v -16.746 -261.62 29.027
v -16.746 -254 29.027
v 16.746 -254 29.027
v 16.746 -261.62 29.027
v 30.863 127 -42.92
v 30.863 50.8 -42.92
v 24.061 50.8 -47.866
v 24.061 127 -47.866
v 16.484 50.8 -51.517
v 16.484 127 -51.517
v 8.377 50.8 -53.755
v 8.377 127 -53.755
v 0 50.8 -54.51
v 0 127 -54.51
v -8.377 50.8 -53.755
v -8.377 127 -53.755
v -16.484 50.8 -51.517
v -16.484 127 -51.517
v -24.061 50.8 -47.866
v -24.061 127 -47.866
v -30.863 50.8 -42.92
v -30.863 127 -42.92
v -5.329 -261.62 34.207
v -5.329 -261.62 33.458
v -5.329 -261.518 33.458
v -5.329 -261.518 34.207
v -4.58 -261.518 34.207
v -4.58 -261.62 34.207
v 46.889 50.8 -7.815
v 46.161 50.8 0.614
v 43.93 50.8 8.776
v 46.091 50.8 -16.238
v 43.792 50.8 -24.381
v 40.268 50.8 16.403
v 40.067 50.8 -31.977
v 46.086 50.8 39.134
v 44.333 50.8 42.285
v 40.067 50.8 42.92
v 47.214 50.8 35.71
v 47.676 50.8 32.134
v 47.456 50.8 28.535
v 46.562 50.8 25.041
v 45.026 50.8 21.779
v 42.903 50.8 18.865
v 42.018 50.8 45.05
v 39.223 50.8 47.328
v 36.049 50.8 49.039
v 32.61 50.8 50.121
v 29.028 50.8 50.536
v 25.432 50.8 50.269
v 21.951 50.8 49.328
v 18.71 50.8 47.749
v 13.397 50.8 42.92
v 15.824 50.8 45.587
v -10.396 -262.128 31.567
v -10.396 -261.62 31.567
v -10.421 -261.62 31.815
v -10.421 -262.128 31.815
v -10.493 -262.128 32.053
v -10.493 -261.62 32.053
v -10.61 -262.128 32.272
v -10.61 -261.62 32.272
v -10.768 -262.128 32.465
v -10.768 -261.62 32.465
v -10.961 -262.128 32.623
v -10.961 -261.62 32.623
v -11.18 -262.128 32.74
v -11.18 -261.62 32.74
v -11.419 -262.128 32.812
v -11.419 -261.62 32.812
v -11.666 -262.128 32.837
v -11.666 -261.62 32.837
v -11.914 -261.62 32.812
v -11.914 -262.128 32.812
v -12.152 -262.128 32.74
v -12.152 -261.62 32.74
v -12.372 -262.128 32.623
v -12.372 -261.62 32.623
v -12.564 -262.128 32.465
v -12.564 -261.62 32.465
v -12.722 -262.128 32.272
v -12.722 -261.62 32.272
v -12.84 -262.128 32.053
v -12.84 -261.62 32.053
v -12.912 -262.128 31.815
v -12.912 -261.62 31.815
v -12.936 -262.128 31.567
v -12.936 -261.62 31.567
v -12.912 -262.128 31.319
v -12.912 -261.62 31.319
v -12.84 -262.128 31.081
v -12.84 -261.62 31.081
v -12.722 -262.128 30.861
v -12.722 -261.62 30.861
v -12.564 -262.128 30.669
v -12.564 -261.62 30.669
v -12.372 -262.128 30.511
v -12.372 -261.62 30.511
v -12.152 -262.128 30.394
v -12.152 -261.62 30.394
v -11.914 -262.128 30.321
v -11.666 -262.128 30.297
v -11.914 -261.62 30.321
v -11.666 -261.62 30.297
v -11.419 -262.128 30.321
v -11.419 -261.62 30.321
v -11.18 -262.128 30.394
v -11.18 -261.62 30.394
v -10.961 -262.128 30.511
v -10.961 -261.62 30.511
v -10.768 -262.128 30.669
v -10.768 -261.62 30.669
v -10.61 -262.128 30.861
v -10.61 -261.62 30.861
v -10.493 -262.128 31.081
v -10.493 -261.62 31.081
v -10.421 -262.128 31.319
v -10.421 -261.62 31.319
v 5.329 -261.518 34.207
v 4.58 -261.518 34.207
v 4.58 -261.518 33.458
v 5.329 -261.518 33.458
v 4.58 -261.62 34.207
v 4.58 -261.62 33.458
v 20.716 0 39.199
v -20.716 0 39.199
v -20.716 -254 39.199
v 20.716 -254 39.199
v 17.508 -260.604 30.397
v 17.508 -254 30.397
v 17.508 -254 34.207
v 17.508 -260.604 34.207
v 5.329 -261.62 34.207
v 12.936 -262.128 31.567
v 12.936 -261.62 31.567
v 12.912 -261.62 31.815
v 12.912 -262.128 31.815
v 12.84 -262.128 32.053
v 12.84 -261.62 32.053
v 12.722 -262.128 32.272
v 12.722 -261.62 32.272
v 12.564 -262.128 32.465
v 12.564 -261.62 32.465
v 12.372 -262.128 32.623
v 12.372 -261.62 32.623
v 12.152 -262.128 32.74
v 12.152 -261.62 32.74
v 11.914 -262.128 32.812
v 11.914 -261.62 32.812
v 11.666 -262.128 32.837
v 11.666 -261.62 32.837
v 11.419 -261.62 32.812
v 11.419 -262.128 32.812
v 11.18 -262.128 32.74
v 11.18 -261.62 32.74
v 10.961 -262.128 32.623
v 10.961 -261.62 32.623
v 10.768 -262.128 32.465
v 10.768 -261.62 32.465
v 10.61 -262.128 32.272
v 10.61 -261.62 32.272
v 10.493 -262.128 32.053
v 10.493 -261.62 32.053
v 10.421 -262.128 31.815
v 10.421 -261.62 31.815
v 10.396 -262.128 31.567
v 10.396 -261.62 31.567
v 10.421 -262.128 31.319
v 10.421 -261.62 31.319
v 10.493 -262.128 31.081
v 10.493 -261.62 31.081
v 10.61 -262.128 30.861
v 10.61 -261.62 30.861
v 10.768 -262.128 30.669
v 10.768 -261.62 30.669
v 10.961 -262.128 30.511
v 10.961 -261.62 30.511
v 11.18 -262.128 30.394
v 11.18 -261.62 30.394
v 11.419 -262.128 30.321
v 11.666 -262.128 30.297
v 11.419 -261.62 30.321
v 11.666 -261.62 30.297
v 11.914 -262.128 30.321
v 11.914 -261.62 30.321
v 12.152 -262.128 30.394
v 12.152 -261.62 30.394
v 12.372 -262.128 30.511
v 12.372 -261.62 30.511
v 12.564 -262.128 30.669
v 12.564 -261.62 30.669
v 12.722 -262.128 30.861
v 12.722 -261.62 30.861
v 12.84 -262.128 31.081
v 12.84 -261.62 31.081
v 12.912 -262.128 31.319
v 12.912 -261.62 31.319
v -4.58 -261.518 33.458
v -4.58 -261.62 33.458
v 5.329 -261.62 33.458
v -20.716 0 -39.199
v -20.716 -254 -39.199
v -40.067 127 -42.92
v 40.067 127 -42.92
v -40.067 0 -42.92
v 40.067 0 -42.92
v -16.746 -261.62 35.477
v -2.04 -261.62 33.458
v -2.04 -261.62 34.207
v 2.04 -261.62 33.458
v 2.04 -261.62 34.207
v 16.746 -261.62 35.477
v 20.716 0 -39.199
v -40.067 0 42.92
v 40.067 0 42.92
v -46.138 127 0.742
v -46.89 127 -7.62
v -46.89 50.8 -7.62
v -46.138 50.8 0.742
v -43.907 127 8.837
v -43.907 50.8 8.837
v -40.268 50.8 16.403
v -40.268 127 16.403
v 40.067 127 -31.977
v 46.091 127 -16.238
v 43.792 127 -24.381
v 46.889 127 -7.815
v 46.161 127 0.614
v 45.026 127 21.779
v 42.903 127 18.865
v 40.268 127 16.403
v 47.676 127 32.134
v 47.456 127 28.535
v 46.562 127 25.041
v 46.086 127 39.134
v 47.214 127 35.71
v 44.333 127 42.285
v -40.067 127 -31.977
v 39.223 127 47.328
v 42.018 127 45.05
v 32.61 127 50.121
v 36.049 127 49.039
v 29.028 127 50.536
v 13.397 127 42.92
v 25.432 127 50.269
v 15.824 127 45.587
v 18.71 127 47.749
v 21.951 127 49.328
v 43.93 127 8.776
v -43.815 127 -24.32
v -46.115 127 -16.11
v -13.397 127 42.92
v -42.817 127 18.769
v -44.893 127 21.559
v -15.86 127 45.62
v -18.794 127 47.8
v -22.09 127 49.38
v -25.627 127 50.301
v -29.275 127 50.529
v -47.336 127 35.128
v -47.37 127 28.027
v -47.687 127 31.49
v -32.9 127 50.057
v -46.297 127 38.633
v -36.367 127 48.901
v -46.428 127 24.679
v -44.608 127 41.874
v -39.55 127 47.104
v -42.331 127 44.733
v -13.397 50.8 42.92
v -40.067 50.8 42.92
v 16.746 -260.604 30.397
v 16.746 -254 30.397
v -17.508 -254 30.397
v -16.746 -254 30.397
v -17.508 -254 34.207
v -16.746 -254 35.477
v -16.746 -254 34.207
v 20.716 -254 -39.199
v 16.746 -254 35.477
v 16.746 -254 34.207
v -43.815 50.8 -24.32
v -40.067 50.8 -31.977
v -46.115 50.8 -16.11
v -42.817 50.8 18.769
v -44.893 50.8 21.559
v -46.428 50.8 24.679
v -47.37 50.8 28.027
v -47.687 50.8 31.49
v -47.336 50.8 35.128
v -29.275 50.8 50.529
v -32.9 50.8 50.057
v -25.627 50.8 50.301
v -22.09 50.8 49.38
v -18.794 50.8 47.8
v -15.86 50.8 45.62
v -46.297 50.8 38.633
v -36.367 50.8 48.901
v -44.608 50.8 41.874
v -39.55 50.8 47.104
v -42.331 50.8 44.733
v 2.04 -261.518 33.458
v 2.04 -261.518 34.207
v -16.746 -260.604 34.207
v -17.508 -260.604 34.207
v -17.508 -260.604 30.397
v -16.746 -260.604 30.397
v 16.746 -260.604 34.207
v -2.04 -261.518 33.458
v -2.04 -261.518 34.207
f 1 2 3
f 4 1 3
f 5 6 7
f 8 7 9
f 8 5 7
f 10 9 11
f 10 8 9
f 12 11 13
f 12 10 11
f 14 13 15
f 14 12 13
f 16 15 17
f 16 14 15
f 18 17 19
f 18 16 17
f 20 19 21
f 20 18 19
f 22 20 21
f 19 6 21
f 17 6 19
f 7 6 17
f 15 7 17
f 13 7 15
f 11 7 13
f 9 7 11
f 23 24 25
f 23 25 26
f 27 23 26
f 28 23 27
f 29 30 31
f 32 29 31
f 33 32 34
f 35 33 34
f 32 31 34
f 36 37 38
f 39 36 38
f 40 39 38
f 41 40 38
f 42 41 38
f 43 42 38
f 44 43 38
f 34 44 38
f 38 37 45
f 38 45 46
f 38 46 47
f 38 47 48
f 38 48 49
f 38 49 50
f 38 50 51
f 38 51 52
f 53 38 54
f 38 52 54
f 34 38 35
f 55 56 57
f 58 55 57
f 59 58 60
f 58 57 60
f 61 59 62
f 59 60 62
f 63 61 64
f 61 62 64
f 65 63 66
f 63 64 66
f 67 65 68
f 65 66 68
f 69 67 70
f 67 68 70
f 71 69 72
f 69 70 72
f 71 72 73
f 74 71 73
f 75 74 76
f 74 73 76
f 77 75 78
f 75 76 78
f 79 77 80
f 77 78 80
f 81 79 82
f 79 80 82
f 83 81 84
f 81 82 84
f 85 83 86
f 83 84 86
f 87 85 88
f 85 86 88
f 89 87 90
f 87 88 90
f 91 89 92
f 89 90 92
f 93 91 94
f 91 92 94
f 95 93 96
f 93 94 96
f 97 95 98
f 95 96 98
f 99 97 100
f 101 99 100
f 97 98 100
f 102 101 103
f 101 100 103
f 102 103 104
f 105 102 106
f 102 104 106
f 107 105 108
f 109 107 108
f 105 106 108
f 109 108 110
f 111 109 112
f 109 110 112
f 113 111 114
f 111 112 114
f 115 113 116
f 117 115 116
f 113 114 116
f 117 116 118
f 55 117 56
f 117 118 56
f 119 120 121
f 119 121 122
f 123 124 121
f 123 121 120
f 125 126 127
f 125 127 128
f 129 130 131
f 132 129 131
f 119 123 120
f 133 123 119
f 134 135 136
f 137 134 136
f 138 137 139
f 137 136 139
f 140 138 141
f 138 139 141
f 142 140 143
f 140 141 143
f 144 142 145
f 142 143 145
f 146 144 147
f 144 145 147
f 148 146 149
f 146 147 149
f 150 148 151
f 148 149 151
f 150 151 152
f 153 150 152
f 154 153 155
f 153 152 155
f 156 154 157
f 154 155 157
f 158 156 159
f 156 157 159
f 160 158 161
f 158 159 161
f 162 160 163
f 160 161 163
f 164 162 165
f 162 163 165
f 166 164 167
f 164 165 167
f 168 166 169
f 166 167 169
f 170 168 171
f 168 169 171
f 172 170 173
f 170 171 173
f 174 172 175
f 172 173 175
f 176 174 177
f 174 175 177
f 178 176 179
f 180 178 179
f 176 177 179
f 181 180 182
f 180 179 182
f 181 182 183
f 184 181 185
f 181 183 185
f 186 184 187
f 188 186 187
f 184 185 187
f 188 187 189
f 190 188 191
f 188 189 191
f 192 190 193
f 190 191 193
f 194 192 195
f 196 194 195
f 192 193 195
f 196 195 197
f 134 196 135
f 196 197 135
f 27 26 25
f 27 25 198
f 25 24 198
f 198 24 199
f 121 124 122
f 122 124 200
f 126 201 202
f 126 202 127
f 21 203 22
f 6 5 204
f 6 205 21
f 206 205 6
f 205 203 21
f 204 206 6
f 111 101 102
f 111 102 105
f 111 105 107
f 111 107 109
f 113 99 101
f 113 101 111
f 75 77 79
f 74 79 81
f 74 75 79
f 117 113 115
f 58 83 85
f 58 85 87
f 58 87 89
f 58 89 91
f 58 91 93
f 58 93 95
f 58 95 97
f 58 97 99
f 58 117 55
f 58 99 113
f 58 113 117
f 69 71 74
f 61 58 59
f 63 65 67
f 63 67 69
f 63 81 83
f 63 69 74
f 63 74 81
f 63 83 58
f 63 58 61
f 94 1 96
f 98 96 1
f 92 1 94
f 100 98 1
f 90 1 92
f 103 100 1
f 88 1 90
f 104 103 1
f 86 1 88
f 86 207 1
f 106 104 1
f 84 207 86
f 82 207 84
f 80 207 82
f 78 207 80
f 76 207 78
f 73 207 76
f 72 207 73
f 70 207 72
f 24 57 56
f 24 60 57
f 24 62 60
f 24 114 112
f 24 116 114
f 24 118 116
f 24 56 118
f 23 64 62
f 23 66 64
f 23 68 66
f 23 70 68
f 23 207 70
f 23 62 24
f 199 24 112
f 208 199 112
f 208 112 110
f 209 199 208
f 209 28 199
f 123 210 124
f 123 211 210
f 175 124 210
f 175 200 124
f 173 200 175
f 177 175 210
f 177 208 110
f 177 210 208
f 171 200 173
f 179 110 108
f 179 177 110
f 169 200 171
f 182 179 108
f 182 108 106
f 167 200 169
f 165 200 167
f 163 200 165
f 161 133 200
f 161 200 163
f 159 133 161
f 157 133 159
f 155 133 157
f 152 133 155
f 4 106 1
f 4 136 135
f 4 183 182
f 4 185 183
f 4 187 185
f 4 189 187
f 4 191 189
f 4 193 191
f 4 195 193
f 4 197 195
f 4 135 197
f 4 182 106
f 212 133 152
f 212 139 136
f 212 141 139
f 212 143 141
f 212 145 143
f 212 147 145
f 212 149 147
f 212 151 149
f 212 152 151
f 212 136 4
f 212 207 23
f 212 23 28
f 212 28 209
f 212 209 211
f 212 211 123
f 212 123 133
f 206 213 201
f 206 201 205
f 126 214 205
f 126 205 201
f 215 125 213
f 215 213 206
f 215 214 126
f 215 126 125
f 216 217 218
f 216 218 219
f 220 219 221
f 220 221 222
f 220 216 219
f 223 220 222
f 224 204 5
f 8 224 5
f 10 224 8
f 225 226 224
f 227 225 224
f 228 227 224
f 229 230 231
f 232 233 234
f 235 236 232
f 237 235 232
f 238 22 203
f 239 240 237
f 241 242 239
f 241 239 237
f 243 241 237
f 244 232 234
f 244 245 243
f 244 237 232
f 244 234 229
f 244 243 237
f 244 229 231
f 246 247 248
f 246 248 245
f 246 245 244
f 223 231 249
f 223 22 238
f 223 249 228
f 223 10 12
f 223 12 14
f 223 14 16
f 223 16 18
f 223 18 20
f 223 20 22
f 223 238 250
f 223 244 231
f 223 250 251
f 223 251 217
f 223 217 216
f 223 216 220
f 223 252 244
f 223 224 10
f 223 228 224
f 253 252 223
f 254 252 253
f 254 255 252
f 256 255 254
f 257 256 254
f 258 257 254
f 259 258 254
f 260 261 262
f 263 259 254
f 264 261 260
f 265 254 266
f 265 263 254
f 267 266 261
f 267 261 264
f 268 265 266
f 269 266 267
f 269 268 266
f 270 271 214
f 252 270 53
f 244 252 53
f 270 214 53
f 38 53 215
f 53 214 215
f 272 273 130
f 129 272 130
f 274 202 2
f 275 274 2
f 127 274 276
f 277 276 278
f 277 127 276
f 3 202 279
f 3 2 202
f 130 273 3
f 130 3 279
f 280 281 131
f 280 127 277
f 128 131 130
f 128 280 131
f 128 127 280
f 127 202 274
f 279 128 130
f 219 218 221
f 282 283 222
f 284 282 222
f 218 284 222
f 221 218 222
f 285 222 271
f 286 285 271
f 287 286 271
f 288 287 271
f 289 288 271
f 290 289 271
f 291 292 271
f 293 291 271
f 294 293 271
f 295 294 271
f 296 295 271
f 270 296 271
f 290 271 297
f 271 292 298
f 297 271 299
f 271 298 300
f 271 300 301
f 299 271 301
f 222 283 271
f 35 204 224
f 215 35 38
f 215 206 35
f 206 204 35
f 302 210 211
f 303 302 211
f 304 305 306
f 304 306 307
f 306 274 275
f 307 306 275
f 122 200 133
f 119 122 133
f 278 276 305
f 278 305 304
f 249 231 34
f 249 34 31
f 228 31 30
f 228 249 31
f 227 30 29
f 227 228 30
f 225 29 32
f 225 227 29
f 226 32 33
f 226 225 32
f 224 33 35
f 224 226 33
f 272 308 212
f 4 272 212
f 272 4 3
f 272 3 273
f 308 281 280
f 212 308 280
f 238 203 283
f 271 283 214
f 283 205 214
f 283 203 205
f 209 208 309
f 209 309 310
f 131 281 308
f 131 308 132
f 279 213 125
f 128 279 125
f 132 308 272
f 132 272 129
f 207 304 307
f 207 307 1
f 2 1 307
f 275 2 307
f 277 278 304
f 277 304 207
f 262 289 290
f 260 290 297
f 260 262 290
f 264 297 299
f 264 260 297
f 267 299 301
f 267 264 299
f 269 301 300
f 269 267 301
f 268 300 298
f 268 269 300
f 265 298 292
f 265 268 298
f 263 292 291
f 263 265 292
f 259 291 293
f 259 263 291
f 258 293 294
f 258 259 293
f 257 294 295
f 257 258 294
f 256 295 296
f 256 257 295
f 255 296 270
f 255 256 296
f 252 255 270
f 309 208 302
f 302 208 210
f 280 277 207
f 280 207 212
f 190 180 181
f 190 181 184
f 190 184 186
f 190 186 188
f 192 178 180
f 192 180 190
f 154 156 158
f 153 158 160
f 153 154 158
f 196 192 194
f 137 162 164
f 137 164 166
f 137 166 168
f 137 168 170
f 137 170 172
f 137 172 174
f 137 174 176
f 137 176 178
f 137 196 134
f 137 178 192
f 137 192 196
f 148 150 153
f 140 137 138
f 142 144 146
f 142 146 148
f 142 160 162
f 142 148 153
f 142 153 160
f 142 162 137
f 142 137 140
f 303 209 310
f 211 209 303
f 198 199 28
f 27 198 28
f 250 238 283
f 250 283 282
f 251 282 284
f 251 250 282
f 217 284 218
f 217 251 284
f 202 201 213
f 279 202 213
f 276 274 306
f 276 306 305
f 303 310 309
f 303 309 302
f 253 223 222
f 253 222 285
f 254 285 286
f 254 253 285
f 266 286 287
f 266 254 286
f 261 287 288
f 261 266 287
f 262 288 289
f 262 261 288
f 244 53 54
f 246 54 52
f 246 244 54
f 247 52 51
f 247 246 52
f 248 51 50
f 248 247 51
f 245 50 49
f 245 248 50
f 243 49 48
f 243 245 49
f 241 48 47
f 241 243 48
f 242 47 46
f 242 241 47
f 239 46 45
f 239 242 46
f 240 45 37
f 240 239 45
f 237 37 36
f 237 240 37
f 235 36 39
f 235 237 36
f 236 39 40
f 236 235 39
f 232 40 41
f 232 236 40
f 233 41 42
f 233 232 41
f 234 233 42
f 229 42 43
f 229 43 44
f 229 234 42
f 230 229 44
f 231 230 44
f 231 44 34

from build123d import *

# Parameters (mm, degrees)
F0_W      = 41.4315387607
F0_H      = 78.3974006772
F1_DEPTH  = 254
F2_W      = 80.1340416074
F2_H      = 85.8401879668
F3_DEPTH  = 127
F4_W      = 33.4925614297
F4_H      = 6.4504221082
F5_DEPTH  = 7.62
F6_W      = 4.0796049871
F6_H      = 0.7493942976
F6_W_2    = 0.7494016
F7_DEPTH  = 0.1016
F8_R      = 1.27
F9_DEPTH  = 0.508
F10_W     = 0.762
F10_H     = 3.81
F11_DEPTH = 6.604
F13_DEPTH = 76.2


with BuildPart() as f1:
    # F0 (on Front) → F1 (new body)
    with BuildSketch(Plane.XZ):
        Rectangle(F0_W, F0_H)
    extrude(amount=F1_DEPTH)

    # F2 (on Front) → F3 (join)
    with BuildSketch(Plane.XZ):
        Rectangle(F2_W, F2_H)
    extrude(amount=-F3_DEPTH)

    # F4 (on face) → F5 (join)
    with BuildSketch(Plane.XZ.offset(254)):
        with Locations((0, 32.2520956397)):
            Rectangle(F4_W, F4_H)
    extrude(amount=F5_DEPTH)

    # F6 (on face) → F7 (cut)
    with BuildSketch(Plane.XZ.offset(261.62)):
        with Locations((0, 33.832609545)):
            Rectangle(F6_W, F6_H)
        with Locations((4.9545032935, 33.832609545)):
            Rectangle(F6_W_2, F6_H)
        with Locations((-4.9545032935, 33.832609545)):
            Rectangle(F6_W_2, F6_H)
    extrude(amount=-F7_DEPTH, mode=Mode.SUBTRACT)

    # F8 (on face) → F9 (join)
    with BuildSketch(Plane.XZ.offset(261.62)):
        with Locations((-11.6662807149, 31.5668845856)):
            Circle(F8_R)
        with Locations((11.6662807149, 31.5668845856)):
            Circle(F8_R)
    extrude(amount=F9_DEPTH)

    # F10 (on face) → F11 (join)
    with BuildSketch(Plane.XZ.offset(254)):
        with Locations((-17.1272807149, 32.3023066938)):
            Rectangle(F10_W, F10_H)
        with Locations((17.1272807149, 32.3023066938)):
            Rectangle(F10_W, F10_H)
    extrude(amount=F11_DEPTH)

    # F12 (on face) → F13 (join)
    with BuildSketch(Plane(origin=(0, 127, 0), x_dir=(-1, 0, 0), z_dir=(0, 1, 0))):
        with BuildLine():
            ThreePointArc((-40.2683013835, 16.40315221), (-20.2308740956, 14.3950889374), (-9.5870208037, 31.4900939834))
            ThreePointArc((-9.5870208037, 31.4900939834), (-9.8780164285, 34.807058688), (-10.7421131765, 38.0226877267))
            ThreePointArc((-10.7421131765, 38.0226877267), (-27.7013840338, 30.2122780312), (-40.2683013835, 16.40315221))
        make_face()
        with BuildLine():
            ThreePointArc((-10.7421131765, 38.0226877267), (-9.8780164285, 34.807058688), (-9.5870208037, 31.4900939834))
            ThreePointArc((-9.5870208037, 31.4900939834), (-20.2308740956, 14.3950889374), (-40.2683013835, 16.40315221))
            ThreePointArc((-40.2683013835, 16.40315221), (-12.4594875766, -52.8240828659), (46.8897423582, -7.62))
            ThreePointArc((46.8897423582, -7.62), (45.2040828659, 4.8394875766), (40.2683013835, 16.40315221))
            ThreePointArc((40.2683013835, 16.40315221), (17.3827178516, 16.1198901766), (10.7421131765, 38.0226877267))
            ThreePointArc((10.7421131765, 38.0226877267), (0, 39.2697423582), (-10.7421131765, 38.0226877267))
        make_face()
        with BuildLine():
            ThreePointArc((-40.2683013835, 16.40315221), (-27.7013840338, 30.2122780312), (-10.7421131765, 38.0226877267))
            ThreePointArc((-10.7421131765, 38.0226877267), (-39.8913237558, 46.8602977902), (-40.2683013835, 16.40315221))
        make_face()
        with BuildLine():
            ThreePointArc((40.2683013835, 16.40315221), (27.7013840338, 30.2122780312), (10.7421131765, 38.0226877267))
            ThreePointArc((10.7421131765, 38.0226877267), (17.3827178516, 16.1198901766), (40.2683013835, 16.40315221))
        make_face()
        with BuildLine():
            ThreePointArc((47.6870208037, 31.4900939834), (31.9539855082, 50.2490983586), (10.7421131765, 38.0226877267))
            ThreePointArc((10.7421131765, 38.0226877267), (27.7013840338, 30.2122780312), (40.2683013835, 16.40315221))
            ThreePointArc((40.2683013835, 16.40315221), (45.7320258497, 23.0839472754), (47.6870208037, 31.4900939834))
        make_face()
    extrude(amount=-F13_DEPTH)


solid = f1.part
